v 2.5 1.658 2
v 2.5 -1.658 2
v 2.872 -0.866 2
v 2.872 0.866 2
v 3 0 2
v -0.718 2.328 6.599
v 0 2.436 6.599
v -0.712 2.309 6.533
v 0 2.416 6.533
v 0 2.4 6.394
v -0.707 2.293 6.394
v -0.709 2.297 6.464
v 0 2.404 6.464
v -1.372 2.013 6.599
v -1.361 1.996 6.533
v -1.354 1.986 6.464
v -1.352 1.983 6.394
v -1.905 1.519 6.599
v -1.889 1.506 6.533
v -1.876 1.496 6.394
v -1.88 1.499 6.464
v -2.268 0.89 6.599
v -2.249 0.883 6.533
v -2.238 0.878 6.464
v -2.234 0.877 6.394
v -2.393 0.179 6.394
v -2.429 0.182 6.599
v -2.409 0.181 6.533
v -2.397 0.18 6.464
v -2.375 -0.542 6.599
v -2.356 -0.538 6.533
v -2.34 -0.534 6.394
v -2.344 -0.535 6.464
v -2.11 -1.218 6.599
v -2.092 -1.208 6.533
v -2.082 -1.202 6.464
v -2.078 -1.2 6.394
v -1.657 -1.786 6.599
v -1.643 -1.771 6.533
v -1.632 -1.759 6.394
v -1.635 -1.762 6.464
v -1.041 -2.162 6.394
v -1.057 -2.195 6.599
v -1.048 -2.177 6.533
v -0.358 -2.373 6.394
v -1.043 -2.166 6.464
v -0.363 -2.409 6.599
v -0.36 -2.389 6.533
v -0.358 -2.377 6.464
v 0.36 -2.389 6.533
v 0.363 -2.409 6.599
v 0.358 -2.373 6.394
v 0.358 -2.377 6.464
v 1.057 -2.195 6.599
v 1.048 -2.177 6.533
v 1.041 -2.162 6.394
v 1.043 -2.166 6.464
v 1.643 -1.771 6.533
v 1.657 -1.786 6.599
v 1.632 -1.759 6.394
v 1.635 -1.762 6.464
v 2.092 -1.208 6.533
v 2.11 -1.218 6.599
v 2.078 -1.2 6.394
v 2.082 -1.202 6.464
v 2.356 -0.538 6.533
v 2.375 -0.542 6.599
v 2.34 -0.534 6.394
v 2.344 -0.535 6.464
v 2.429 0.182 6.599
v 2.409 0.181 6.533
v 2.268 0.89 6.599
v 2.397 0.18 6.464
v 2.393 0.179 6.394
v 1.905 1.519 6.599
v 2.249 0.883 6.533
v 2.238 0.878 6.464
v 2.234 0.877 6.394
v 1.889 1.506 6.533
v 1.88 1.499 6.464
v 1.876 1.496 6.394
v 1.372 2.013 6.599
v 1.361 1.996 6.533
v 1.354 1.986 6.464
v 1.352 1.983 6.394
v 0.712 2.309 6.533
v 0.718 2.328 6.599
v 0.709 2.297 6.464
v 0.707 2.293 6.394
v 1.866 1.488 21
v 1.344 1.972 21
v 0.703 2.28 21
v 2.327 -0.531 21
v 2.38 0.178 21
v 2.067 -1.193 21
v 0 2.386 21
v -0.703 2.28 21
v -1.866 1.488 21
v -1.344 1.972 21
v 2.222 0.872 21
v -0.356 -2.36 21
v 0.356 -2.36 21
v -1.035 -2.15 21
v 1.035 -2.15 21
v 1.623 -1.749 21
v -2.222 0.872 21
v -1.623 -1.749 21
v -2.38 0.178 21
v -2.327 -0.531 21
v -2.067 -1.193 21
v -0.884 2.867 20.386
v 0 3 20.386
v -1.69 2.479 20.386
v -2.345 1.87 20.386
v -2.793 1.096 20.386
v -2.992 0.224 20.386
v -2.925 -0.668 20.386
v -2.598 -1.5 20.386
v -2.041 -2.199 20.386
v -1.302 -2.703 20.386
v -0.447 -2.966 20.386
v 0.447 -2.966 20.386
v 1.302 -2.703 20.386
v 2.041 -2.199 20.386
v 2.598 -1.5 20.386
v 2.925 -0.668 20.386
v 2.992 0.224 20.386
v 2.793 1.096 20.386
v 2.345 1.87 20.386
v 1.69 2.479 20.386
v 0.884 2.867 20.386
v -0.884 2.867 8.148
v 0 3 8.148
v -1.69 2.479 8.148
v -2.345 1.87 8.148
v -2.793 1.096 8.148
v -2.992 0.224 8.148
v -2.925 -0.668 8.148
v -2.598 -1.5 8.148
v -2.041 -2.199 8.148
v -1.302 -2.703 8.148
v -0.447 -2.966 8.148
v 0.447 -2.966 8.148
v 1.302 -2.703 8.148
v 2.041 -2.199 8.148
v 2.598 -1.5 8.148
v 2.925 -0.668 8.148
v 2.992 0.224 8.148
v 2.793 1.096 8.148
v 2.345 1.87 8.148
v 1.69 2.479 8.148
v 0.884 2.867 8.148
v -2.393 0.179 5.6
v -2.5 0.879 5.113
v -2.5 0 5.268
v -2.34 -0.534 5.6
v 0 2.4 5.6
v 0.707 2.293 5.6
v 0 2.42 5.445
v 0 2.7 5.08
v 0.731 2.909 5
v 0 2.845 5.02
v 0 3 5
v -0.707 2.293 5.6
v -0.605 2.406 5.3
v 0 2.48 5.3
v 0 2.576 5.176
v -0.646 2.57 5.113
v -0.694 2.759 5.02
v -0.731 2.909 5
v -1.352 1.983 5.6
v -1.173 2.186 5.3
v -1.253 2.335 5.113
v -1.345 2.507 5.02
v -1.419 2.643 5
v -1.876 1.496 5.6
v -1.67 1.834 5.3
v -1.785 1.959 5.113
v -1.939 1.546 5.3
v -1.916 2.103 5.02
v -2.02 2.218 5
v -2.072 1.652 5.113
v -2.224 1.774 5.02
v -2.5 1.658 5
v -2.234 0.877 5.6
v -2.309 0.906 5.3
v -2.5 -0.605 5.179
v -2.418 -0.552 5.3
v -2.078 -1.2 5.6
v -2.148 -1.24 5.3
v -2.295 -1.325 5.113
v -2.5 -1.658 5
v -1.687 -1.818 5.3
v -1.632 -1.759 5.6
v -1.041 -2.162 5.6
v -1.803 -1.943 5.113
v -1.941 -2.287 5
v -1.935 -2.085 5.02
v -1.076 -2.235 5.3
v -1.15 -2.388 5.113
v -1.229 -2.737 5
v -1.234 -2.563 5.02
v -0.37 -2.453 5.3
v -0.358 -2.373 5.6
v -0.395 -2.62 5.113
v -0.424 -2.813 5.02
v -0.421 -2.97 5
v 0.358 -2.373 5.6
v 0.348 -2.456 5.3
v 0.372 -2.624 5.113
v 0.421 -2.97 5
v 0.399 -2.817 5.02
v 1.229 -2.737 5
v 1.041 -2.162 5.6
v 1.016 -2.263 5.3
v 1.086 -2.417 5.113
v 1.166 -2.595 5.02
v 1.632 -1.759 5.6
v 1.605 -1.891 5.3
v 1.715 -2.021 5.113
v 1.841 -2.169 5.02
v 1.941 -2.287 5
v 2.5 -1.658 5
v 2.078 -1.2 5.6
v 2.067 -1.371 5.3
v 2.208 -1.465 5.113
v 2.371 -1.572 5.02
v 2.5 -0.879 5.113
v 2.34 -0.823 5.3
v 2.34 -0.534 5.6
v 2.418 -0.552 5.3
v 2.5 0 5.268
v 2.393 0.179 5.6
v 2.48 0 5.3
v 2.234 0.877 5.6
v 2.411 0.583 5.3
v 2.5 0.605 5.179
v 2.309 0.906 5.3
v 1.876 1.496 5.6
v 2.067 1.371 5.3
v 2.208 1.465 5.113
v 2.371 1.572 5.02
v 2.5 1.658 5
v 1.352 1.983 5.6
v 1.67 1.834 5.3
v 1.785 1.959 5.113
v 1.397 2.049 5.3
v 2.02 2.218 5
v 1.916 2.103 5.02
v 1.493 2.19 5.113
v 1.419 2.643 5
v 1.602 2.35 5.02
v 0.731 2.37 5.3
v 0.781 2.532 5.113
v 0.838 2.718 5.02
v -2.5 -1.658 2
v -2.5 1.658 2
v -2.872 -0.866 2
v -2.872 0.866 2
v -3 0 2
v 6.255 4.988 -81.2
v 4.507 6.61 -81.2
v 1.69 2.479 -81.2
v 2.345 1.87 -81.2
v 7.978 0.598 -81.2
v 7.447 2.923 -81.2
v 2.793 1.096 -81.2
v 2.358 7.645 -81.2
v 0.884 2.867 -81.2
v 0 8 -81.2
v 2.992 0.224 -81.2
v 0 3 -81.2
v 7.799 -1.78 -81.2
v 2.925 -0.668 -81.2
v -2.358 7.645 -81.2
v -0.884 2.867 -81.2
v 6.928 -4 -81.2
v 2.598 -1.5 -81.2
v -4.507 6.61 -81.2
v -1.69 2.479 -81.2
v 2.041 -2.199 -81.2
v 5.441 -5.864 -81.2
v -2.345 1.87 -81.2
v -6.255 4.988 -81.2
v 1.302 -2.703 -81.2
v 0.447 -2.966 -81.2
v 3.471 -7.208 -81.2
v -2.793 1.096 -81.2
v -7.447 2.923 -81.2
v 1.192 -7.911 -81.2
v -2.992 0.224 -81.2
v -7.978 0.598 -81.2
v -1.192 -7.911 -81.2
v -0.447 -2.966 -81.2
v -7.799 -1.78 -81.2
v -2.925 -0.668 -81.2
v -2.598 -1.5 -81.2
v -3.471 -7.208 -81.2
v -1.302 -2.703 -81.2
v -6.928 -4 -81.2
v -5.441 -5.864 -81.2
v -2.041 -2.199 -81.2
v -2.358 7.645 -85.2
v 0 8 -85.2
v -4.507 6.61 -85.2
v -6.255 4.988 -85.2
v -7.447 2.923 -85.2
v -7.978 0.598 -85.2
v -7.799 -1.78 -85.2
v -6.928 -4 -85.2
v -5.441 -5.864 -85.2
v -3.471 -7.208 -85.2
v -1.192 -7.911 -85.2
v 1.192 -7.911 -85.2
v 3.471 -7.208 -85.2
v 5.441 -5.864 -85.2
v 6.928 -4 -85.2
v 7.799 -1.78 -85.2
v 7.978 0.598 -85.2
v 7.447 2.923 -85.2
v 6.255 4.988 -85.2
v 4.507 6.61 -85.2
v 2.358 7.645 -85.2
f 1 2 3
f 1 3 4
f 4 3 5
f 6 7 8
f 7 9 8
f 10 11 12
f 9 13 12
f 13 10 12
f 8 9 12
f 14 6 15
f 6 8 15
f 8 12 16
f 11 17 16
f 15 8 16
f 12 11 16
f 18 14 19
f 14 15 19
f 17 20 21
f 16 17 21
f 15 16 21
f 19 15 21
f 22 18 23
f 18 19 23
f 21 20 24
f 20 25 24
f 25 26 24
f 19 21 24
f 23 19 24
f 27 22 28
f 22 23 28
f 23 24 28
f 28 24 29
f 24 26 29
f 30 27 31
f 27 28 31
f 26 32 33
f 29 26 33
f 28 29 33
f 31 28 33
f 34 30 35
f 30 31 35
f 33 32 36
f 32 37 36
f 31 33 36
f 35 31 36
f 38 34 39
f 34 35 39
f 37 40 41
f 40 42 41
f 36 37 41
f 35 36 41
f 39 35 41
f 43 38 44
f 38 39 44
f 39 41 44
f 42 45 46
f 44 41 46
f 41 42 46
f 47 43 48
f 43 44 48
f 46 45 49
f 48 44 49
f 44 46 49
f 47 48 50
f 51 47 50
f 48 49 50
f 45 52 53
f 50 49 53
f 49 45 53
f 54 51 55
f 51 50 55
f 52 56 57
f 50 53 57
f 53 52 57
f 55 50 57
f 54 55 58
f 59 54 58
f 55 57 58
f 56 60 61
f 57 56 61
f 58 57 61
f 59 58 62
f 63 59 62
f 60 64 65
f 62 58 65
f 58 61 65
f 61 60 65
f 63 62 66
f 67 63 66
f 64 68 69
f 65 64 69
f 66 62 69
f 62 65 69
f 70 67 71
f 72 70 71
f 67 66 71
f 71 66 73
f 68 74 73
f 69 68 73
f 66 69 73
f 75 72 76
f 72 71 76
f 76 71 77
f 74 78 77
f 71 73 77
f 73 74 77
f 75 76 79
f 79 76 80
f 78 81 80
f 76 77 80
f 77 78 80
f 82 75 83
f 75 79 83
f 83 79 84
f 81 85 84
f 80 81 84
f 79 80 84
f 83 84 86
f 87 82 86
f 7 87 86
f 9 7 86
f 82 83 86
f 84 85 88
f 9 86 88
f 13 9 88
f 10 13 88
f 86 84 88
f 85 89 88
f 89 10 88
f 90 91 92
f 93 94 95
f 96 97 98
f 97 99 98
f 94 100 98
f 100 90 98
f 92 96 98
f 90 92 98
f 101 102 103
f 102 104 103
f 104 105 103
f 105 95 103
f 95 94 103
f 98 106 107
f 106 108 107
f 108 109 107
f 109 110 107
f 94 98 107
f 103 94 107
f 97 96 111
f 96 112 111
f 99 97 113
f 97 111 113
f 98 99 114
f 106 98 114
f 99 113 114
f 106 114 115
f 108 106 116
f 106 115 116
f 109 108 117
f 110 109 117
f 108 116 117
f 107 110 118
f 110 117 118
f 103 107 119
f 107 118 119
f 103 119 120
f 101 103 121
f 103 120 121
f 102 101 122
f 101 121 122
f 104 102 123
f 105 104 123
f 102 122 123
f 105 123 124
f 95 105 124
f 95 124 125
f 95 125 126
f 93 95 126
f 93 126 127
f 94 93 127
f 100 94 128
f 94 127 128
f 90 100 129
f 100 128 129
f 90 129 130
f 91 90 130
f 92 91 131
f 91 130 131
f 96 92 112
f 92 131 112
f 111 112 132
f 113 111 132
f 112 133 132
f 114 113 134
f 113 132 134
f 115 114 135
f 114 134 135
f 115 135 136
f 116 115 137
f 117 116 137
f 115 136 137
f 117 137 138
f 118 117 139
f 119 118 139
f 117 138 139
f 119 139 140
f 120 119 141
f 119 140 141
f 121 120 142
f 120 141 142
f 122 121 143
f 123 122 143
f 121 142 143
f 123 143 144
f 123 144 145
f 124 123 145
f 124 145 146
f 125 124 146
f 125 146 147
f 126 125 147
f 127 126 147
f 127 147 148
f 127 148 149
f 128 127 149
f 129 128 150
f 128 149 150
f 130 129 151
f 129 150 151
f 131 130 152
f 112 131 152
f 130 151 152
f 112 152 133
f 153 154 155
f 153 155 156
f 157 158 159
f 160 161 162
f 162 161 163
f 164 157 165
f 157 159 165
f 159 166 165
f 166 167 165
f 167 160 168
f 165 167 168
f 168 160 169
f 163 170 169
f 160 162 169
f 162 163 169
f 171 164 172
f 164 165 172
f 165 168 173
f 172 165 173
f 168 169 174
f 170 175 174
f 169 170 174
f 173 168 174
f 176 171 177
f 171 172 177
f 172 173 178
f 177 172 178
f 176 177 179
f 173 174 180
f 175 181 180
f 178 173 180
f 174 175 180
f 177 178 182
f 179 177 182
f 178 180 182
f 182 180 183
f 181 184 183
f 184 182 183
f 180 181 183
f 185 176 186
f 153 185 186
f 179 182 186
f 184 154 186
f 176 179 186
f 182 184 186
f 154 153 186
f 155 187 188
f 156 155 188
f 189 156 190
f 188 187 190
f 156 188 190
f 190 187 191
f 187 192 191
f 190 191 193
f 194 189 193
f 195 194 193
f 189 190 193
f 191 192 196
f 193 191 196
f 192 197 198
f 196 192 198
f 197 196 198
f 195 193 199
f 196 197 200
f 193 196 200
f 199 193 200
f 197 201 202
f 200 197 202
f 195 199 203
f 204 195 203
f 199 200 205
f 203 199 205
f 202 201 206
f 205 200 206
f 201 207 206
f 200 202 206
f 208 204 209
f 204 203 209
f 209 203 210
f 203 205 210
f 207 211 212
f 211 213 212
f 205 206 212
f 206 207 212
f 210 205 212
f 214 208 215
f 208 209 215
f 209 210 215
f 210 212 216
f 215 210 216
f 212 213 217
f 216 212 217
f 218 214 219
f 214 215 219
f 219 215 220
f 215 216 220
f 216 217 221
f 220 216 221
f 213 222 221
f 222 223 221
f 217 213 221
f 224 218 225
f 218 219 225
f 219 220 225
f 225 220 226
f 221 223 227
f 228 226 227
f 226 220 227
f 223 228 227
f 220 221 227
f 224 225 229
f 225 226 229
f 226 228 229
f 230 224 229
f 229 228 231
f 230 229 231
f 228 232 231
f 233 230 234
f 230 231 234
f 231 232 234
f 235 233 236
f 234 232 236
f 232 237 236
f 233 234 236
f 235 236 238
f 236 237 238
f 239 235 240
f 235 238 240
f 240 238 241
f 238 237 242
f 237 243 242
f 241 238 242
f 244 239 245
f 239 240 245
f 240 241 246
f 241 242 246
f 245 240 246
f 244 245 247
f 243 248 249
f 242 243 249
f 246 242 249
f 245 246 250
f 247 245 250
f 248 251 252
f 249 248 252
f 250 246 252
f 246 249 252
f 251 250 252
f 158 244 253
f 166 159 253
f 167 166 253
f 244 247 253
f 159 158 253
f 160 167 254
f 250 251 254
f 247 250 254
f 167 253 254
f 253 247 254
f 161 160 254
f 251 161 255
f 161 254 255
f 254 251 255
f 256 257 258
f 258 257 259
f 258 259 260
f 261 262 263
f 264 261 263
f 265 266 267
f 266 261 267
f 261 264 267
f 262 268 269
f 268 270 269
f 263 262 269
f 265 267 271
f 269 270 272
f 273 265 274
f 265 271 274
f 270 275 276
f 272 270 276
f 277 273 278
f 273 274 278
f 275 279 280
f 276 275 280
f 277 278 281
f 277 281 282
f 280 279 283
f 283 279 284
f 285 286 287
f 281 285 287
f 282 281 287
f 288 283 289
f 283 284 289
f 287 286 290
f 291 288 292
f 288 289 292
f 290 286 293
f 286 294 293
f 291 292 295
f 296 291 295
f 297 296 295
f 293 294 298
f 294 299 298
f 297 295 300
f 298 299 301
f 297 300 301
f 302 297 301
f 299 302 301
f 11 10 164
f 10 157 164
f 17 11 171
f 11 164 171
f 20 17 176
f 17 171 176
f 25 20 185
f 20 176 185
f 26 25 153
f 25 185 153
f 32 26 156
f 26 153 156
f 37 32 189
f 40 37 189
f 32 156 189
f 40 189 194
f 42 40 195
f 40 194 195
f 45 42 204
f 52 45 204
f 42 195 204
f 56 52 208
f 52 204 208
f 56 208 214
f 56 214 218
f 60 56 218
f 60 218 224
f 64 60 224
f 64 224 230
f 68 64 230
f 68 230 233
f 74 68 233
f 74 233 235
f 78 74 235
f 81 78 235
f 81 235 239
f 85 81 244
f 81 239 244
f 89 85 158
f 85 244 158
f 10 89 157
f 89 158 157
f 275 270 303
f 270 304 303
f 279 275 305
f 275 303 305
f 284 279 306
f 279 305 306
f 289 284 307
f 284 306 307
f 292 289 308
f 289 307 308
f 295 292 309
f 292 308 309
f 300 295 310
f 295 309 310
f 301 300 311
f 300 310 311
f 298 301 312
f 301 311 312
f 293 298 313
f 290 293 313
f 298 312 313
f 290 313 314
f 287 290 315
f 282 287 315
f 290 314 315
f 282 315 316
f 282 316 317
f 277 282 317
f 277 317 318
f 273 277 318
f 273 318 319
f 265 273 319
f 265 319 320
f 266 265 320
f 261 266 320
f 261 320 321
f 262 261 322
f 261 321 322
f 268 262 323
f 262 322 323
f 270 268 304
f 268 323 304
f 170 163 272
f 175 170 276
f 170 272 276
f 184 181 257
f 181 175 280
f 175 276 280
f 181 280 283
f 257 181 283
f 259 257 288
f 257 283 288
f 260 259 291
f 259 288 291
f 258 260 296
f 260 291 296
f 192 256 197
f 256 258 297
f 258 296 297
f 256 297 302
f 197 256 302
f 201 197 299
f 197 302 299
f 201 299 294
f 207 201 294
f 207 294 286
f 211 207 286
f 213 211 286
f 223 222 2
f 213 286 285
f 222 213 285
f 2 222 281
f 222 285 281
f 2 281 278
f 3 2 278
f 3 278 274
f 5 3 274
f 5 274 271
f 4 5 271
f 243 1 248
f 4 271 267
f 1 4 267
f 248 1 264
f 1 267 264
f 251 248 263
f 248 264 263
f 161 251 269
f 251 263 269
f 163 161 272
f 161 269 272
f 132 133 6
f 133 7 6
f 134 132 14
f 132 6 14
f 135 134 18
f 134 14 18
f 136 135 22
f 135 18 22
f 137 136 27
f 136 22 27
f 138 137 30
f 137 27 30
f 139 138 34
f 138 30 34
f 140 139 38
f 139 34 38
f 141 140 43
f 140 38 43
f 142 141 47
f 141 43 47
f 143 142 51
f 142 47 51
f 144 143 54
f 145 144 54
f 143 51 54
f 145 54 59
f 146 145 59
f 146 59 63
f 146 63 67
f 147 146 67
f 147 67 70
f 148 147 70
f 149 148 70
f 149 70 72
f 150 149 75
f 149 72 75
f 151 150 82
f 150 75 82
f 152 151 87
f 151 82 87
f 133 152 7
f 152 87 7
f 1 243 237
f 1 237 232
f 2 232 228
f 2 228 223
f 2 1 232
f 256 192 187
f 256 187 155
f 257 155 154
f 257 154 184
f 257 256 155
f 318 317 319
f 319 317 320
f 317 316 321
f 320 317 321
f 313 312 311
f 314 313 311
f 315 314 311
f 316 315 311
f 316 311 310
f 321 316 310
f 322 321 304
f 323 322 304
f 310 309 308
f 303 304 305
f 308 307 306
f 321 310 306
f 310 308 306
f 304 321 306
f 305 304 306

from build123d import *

# Parameters (mm, degrees)
CUT_EXTRUDE1_DEPTH = 4


with BuildPart() as part:
    # Sketch1 → Revolve1 (revolve)
    with BuildSketch(Plane(origin=(0, 0, 0), x_dir=(0, 0, -1), z_dir=(1, 0, 0))):
        Polygon((-5, 0), (-5, 3), (81.2, 3), (81.2, 8), (85.2, 8), (85.2, 0), align=None)
    revolve(axis=Axis((0, 0, -85.2), (0, 0, 1)))

    # Sketch2 → Revolve2 (revolve)
    with BuildSketch(Plane(origin=(0, 0, 0), x_dir=(0, 0, -1), z_dir=(1, 0, 0))):
        with BuildLine():
            Line((-21, 0), (-21, 2.3865))
            Line((-21, 2.3865), (-20.3865, 3))
            Line((-20.3865, 3), (-8.148486452, 3))
            Line((-8.148486452, 3), (-6.599415898, 2.436184428))
            ThreePointArc((-6.599415898, 2.436184428), (-6.498392718, 2.409115348), (-6.394203812, 2.4))
            Line((-6.394203812, 2.4), (-5.6, 2.4))
            ThreePointArc((-5.6, 2.4), (-5.175735931, 2.575735931), (-5, 3))
            Line((-5, 3), (-4, 3))
            Line((-4, 3), (-4, 0))
            Line((-4, 0), (-21, 0))
        make_face()
    revolve(axis=Axis((0, 0, 4), (0, 0, 1)))

    # Sketch3 → Cut-Extrude1 (cut)
    with BuildSketch(Plane.XY.offset(2)):
        Polygon((-5, 10), (-5, -5), (-2.5, -5), (-2.5, 5), (2.5, 5), (2.5, -5), (5, -5), (5, 10), align=None)
    extrude(amount=CUT_EXTRUDE1_DEPTH, mode=Mode.SUBTRACT)


solid = part.part
